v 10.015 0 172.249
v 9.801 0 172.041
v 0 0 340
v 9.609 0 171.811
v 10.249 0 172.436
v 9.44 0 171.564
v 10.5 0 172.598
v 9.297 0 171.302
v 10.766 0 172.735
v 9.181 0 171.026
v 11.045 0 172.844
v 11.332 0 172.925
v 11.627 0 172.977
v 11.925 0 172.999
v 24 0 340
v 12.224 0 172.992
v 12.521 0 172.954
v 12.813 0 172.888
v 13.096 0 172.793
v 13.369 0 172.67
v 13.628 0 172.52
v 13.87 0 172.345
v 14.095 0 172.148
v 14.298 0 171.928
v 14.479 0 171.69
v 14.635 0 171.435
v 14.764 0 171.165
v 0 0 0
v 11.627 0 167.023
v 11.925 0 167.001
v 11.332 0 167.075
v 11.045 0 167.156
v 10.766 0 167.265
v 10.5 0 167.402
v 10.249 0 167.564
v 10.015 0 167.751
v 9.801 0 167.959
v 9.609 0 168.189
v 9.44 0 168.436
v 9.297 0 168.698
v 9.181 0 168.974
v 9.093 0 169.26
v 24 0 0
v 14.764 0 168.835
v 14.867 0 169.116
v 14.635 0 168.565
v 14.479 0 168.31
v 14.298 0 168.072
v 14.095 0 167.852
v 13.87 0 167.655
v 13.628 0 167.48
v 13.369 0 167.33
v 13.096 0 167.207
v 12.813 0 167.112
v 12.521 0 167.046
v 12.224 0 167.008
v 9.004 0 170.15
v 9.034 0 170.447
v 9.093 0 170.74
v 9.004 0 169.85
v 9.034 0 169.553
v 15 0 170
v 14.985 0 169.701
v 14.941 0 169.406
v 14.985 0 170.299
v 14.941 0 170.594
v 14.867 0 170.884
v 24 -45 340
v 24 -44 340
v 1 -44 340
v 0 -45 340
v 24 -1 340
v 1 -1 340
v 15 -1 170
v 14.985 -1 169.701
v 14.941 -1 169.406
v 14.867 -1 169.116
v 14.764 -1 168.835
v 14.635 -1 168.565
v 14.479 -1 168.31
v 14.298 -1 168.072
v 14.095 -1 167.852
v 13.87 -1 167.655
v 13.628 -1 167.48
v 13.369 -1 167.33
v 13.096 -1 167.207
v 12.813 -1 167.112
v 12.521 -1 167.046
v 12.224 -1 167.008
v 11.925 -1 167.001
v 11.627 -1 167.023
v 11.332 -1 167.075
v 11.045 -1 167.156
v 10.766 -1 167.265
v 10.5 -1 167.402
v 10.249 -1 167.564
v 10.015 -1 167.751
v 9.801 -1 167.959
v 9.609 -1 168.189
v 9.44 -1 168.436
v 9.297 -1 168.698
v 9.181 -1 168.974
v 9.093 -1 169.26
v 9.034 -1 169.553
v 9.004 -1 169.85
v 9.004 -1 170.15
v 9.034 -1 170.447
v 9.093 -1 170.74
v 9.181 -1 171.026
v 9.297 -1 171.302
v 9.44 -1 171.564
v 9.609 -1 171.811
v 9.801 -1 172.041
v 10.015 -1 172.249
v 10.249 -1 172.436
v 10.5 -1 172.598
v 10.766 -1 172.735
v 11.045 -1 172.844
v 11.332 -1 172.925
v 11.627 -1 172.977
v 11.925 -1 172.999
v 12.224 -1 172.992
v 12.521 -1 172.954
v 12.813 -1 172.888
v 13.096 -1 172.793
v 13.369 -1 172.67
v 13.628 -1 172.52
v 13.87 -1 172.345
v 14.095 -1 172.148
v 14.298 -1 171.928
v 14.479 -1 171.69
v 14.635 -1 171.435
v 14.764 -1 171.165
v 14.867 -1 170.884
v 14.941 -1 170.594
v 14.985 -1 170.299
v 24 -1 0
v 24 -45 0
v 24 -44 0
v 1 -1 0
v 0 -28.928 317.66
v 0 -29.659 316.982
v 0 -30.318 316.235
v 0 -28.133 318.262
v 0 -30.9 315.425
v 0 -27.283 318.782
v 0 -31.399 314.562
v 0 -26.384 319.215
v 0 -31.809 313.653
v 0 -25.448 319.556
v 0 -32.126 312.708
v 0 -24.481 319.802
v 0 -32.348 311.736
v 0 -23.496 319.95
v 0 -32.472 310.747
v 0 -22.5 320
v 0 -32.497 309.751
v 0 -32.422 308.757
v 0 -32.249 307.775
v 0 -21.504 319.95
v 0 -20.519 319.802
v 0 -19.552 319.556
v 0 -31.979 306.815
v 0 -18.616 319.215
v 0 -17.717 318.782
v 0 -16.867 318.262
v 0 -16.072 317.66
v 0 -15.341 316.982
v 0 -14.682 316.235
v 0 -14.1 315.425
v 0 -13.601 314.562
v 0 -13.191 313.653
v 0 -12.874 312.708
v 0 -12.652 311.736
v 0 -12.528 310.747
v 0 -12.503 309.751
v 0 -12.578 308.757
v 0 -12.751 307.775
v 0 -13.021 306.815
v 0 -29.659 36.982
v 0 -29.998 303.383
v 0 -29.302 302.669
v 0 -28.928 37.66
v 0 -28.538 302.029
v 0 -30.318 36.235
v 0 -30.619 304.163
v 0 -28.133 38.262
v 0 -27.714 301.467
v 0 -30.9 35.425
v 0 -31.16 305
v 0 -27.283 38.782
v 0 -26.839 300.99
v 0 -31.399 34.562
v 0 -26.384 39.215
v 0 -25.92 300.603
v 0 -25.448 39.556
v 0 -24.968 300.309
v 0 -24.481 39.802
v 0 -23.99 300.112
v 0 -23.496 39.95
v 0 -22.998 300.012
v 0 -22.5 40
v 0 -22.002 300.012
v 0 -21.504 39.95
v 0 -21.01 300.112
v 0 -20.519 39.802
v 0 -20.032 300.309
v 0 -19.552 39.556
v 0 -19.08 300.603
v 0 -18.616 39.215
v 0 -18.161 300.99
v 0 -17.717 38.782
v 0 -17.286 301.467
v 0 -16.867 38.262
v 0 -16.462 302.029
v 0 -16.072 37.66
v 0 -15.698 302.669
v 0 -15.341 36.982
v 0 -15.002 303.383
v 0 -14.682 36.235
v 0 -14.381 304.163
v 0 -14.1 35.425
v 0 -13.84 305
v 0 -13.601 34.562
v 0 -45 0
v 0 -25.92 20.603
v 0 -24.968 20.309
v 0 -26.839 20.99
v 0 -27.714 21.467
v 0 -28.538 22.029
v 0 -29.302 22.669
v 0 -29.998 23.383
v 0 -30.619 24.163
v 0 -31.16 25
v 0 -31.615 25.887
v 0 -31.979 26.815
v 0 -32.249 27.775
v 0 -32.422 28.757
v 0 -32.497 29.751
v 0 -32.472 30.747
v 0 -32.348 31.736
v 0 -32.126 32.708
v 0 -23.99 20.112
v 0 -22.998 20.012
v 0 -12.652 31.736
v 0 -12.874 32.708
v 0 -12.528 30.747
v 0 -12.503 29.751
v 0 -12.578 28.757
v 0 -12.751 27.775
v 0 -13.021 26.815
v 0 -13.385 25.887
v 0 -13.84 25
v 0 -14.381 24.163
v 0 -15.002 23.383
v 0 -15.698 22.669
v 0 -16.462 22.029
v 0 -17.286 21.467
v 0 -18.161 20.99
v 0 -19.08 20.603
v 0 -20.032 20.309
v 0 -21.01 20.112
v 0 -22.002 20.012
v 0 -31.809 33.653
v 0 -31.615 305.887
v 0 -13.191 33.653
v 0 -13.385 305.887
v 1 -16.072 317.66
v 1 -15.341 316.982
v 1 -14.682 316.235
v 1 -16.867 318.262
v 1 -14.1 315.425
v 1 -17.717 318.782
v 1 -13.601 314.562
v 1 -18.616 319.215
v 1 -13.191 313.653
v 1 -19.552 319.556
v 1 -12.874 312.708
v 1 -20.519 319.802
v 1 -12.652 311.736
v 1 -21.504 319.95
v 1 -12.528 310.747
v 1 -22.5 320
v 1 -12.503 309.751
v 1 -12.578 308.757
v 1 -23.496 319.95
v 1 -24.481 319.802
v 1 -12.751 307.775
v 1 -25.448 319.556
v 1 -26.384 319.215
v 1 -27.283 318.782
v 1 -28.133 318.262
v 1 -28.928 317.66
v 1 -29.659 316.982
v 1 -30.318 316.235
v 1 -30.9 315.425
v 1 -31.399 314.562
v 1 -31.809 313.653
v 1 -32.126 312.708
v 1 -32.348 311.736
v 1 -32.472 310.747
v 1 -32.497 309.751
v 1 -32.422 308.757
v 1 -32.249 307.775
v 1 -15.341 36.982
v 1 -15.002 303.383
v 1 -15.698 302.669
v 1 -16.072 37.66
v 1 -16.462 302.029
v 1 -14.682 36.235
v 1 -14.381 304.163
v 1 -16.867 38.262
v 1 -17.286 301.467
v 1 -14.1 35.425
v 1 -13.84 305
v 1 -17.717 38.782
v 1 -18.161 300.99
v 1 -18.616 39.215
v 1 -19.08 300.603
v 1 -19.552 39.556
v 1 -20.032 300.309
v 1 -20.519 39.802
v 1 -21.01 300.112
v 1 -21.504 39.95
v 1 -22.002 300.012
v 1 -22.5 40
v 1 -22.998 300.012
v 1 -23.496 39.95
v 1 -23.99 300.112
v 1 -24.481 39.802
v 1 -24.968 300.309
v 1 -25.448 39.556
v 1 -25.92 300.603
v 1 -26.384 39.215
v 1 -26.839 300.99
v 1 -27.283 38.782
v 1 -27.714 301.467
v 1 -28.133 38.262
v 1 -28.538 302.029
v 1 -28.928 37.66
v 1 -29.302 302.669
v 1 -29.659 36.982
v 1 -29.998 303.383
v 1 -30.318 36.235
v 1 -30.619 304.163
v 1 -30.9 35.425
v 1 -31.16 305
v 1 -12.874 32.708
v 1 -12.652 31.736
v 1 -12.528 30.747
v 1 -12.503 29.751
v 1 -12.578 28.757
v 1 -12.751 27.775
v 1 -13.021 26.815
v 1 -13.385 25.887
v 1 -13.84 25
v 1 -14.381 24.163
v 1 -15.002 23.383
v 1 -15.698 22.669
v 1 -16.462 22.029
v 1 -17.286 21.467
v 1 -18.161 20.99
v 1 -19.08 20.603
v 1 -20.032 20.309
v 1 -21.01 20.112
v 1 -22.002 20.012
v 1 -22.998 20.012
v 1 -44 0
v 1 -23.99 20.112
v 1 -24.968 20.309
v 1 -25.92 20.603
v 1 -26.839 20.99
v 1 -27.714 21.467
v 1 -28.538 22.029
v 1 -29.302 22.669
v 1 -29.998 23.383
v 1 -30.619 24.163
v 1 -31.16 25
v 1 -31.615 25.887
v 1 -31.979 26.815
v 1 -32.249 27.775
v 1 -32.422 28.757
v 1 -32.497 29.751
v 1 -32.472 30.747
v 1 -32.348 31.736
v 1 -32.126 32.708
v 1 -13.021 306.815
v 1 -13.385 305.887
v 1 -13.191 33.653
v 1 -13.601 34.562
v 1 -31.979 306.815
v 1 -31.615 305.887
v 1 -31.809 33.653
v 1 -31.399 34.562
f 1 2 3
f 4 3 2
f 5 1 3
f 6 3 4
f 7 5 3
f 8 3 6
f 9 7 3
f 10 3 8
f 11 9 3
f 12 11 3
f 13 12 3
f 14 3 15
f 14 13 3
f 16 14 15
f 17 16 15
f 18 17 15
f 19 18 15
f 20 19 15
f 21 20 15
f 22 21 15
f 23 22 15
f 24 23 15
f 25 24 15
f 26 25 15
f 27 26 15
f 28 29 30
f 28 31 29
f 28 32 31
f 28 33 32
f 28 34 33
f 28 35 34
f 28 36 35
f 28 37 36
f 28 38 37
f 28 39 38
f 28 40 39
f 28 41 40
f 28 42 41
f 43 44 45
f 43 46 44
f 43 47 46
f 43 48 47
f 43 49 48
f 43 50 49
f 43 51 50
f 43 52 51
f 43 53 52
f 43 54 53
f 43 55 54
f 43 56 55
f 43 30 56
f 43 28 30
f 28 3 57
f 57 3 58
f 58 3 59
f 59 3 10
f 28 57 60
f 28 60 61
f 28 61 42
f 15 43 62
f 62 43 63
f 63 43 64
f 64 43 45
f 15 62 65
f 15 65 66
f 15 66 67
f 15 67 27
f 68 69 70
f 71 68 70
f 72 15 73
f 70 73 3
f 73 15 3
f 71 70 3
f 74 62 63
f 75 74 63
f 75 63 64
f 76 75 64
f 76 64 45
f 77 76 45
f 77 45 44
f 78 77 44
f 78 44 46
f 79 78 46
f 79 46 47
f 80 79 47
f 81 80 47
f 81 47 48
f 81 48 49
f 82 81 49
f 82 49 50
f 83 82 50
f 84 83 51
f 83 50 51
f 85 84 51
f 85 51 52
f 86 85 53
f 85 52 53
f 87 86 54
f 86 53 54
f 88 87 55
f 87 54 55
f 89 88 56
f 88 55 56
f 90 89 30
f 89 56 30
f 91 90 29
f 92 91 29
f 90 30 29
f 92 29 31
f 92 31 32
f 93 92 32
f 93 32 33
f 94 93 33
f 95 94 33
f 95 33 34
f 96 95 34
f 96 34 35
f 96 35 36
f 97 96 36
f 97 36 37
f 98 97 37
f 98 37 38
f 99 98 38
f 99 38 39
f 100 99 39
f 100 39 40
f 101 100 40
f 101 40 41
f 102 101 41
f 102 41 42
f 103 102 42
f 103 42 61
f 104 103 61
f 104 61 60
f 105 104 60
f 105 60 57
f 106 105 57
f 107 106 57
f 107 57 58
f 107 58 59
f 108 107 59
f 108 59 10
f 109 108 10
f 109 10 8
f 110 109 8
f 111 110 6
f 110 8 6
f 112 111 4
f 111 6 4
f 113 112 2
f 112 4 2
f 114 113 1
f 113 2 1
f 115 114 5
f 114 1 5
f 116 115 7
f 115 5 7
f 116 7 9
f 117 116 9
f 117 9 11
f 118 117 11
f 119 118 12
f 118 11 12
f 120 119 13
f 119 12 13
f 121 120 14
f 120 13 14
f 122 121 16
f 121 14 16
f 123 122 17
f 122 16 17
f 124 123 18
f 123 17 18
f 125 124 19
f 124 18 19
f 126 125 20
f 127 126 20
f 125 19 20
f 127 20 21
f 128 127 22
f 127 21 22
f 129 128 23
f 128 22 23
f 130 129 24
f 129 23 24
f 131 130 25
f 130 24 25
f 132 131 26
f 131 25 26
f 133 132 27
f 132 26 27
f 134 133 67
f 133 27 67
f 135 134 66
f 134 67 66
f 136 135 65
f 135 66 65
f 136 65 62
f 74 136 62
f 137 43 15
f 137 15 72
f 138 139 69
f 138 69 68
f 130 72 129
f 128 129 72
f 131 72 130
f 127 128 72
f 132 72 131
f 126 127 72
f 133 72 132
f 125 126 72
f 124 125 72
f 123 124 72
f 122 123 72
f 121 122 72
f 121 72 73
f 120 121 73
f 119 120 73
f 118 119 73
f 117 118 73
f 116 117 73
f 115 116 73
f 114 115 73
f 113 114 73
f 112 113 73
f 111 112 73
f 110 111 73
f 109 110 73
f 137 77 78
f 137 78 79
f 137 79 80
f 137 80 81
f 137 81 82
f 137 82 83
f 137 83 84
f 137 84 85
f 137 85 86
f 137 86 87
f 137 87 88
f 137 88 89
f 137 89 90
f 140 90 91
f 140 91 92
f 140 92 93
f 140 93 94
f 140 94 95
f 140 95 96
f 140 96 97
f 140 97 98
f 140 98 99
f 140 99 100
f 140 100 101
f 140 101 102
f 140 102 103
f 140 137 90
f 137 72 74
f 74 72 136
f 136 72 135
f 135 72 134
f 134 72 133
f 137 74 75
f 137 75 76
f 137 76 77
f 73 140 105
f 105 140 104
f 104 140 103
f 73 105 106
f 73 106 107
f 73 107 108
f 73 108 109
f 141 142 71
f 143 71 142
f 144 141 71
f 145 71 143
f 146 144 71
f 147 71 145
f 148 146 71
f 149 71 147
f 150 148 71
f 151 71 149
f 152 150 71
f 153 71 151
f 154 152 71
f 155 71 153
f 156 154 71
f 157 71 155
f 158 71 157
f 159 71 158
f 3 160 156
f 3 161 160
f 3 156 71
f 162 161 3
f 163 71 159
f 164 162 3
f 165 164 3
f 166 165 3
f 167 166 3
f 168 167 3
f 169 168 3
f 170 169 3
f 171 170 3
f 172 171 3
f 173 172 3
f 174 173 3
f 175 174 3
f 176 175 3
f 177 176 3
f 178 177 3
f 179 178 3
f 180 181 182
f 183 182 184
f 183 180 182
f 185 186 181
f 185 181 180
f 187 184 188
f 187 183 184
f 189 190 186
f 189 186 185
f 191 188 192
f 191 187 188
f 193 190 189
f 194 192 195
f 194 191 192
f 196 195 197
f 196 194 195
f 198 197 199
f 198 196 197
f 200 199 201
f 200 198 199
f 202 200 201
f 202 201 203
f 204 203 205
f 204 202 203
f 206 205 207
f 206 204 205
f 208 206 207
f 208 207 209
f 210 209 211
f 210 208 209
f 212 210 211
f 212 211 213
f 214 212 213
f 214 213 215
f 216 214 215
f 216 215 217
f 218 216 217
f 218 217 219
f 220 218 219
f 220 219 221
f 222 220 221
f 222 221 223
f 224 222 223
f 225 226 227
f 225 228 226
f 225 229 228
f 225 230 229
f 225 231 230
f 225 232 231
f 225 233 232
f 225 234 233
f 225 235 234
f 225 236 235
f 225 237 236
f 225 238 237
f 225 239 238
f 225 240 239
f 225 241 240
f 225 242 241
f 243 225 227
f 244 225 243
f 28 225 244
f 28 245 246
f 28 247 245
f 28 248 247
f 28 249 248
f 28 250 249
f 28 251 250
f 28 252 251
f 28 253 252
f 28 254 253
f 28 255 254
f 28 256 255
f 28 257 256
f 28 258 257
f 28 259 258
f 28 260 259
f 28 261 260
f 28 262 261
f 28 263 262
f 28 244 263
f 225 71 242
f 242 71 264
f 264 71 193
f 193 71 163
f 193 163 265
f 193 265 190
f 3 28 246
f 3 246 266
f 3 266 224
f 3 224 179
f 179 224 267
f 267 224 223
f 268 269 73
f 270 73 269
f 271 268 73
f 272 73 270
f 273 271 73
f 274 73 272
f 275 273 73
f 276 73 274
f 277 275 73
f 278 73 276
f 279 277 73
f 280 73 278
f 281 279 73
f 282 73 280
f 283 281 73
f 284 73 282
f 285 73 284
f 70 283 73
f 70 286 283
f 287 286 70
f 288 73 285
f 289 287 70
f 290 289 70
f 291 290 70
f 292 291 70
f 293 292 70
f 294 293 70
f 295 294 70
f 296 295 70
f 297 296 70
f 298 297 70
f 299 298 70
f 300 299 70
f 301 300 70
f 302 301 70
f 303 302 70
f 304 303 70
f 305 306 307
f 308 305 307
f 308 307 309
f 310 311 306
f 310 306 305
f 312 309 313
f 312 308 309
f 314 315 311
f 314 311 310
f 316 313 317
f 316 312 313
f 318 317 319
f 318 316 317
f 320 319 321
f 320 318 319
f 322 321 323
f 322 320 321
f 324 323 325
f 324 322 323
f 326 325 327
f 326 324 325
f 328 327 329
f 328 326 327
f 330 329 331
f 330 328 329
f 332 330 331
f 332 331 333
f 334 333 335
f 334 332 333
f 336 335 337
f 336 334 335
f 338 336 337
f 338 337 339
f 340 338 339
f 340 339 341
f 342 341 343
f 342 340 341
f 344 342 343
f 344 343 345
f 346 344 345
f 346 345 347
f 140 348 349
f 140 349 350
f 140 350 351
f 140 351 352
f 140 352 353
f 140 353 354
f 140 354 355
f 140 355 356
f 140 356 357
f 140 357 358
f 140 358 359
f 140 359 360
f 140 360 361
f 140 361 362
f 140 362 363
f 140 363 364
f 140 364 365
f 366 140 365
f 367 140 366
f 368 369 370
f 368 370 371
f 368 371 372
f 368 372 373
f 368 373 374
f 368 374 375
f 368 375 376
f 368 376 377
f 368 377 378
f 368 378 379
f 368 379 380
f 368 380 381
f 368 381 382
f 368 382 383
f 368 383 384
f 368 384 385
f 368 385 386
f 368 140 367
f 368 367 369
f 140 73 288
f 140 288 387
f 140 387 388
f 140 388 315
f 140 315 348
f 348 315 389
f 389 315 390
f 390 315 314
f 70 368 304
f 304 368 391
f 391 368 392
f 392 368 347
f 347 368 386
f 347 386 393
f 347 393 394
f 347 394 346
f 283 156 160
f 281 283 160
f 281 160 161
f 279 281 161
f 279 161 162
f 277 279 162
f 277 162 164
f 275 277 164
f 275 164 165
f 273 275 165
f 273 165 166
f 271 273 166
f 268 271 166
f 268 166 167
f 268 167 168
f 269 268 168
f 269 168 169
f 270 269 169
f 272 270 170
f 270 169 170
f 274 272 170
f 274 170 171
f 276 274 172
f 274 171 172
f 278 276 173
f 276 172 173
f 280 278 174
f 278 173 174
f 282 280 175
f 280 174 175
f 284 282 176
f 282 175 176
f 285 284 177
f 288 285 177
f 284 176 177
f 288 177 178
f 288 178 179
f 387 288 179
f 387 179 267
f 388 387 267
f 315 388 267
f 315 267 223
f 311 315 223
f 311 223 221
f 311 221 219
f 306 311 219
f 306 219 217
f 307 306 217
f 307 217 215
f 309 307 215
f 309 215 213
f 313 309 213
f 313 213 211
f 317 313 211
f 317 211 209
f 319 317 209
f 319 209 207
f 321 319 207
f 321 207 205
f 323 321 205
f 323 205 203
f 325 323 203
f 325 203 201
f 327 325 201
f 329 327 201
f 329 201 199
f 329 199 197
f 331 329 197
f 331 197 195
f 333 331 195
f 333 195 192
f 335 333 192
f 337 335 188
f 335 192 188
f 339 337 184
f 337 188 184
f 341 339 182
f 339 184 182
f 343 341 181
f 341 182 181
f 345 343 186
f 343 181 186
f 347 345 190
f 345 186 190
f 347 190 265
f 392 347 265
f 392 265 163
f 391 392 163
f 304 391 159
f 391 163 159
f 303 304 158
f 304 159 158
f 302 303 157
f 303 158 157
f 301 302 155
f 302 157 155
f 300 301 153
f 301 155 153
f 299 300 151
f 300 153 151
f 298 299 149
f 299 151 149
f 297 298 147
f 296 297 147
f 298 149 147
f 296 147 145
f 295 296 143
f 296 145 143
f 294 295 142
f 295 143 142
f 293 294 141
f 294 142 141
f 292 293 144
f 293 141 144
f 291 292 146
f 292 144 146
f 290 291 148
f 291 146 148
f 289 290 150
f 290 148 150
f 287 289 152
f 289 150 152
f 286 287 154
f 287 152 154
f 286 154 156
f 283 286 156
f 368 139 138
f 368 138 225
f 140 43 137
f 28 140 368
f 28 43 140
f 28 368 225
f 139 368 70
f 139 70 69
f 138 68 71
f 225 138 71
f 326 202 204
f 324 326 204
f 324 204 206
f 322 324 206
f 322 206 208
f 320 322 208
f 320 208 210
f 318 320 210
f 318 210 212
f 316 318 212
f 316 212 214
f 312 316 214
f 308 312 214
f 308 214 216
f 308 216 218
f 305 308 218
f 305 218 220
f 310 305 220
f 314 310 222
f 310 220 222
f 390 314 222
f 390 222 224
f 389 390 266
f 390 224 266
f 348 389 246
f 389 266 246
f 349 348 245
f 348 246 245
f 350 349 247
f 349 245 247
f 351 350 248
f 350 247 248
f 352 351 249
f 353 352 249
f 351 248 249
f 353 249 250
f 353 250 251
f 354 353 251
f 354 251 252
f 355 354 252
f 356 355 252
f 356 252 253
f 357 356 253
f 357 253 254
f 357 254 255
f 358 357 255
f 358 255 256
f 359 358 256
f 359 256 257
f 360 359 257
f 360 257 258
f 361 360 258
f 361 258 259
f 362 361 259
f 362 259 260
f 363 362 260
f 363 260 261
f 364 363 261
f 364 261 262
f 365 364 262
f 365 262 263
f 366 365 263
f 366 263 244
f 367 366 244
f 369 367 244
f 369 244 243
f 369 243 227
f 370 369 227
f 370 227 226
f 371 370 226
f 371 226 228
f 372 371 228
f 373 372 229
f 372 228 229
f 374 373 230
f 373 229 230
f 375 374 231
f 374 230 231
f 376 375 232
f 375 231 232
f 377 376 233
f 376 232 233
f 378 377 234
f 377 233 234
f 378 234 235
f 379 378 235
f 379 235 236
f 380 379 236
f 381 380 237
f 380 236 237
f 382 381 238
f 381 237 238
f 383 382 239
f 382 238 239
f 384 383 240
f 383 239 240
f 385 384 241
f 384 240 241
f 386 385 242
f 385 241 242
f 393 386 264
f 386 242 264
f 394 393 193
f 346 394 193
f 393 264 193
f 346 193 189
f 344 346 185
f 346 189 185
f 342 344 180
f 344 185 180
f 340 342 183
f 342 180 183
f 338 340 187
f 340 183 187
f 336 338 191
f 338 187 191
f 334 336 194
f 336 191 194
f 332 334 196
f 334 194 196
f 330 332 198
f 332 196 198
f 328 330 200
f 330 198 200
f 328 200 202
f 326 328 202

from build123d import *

# Parameters (mm, degrees)
BOSS_EXTRUDE1_DEPTH = 340
SKETCH3_R           = 10
CUT_EXTRUDE1_DEPTH  = 340
SKETCH4_R           = 3
CUT_EXTRUDE2_DEPTH  = 25


with BuildPart() as part:
    # Sketch2 → Boss-Extrude1 (new body)
    with BuildSketch(Plane.XY):
        Polygon((0, 0), (24, 0), (24, -1), (1, -1), (1, -44), (24, -44), (24, -45), (0, -45), align=None)
    extrude(amount=BOSS_EXTRUDE1_DEPTH)

    # Sketch3 → Cut-Extrude1 (cut)
    with BuildSketch(Plane.ZY):
        with Locations((30, -22.5)):
            Circle(SKETCH3_R)
        with Locations((310, -22.5)):
            Circle(SKETCH3_R)
    extrude(amount=-CUT_EXTRUDE1_DEPTH, mode=Mode.SUBTRACT)

    # Sketch4 → Cut-Extrude2 (cut)
    with BuildSketch(Plane(origin=(0, 0, 0), x_dir=(1, 0, 0), z_dir=(0, 1, 0))):
        with Locations((12, -170)):
            Circle(SKETCH4_R)
    extrude(amount=-CUT_EXTRUDE2_DEPTH, mode=Mode.SUBTRACT)


solid = part.part
